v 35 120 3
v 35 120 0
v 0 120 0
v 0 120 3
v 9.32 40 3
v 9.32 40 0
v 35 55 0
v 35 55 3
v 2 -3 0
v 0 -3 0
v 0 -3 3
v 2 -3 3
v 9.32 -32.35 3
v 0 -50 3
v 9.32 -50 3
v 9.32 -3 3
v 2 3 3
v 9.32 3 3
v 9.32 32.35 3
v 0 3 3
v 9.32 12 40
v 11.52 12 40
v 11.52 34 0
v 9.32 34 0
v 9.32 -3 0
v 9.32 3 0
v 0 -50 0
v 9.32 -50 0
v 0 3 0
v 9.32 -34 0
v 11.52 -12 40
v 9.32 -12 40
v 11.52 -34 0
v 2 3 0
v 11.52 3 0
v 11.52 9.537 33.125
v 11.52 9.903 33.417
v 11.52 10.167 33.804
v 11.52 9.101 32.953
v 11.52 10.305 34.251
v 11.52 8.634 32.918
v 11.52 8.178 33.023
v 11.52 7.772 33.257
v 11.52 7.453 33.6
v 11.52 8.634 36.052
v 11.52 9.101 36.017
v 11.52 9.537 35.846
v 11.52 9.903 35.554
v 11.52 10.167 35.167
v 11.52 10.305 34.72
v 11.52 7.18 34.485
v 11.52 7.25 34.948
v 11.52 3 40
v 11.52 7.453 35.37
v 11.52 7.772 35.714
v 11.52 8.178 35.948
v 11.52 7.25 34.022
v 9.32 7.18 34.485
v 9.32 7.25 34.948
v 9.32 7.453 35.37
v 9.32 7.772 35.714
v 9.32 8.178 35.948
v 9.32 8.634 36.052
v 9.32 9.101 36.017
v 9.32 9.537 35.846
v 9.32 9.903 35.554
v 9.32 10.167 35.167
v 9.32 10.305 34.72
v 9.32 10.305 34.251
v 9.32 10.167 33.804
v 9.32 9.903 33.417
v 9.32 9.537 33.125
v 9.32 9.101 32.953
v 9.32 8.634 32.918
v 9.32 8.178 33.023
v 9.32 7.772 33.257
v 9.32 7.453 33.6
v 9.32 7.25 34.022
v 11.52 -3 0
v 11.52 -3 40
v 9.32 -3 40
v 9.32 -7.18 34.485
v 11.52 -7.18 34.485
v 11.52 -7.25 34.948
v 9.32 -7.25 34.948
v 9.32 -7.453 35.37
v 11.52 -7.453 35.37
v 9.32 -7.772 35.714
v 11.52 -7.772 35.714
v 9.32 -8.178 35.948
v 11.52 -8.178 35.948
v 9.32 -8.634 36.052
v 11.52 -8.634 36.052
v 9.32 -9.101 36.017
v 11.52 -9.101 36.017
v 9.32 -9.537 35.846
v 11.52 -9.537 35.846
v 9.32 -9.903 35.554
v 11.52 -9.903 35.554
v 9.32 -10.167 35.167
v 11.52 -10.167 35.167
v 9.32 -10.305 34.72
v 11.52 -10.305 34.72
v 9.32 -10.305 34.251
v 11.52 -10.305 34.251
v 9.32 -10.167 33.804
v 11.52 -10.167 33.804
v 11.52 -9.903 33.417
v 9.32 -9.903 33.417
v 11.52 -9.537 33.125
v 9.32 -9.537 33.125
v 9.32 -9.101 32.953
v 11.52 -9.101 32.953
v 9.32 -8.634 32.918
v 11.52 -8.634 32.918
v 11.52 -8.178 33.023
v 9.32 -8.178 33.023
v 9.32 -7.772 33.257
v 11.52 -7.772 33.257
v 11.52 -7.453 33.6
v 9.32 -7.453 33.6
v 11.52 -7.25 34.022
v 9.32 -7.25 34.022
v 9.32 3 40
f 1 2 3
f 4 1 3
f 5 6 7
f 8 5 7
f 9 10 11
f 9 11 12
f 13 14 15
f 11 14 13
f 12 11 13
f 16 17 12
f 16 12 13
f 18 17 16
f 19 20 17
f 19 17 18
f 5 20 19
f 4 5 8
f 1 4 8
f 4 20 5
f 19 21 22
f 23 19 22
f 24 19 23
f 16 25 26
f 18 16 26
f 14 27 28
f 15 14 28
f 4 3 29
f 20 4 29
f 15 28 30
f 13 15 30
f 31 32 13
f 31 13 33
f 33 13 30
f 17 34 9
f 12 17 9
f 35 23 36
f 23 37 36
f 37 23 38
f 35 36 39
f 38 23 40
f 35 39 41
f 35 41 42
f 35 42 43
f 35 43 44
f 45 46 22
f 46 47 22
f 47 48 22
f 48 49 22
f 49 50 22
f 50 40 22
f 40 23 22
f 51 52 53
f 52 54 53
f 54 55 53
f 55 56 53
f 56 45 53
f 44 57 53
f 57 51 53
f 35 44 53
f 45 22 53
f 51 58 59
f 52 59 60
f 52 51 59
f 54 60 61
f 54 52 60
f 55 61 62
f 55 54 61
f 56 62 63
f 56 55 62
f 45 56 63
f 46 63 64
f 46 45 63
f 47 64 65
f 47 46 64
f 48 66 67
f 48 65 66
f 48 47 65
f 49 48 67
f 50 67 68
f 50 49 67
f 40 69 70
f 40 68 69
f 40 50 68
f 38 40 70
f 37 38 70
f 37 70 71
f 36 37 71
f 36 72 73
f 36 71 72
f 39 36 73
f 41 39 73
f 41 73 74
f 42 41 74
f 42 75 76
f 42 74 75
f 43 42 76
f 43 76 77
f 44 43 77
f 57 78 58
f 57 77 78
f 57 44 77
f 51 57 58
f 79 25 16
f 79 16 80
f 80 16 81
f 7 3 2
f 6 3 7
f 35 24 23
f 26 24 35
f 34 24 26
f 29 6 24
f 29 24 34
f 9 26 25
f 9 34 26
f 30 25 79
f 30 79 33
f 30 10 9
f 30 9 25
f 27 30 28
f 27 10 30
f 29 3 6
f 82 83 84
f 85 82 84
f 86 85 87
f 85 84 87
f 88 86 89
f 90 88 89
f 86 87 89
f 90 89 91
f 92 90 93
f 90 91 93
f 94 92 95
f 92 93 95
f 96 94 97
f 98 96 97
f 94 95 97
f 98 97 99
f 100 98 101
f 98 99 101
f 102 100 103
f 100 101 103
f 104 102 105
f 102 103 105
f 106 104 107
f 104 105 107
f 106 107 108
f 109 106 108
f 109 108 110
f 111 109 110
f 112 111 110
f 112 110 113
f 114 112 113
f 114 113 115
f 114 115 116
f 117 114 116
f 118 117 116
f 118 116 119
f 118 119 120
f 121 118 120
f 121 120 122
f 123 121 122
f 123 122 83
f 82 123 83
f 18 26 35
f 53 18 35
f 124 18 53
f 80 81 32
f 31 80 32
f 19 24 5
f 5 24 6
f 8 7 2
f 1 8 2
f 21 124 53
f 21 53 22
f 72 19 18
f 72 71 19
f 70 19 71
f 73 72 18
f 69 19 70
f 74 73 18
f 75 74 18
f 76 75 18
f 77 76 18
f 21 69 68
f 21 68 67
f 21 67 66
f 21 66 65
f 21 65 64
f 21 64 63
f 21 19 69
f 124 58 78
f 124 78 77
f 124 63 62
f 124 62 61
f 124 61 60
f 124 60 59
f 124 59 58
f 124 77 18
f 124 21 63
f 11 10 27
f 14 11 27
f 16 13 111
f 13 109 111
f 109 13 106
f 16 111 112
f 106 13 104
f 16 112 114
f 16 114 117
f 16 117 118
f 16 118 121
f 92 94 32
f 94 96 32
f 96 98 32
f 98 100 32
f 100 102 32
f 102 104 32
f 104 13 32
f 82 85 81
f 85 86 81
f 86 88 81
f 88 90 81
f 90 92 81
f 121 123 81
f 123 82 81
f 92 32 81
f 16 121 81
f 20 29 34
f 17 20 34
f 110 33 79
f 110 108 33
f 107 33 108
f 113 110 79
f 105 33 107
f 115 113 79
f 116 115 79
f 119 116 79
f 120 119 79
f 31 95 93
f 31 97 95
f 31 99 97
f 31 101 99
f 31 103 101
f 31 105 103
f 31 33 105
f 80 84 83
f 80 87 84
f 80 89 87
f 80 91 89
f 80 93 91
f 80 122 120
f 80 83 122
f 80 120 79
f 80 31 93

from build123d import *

# Parameters (mm, degrees)
PAD_DEPTH       = 3
SKETCH001_W     = 2
SKETCH001_H     = 6
POCKET_DEPTH    = 5
PAD001_DEPTH    = 2.2
SKETCH003_R     = 1.571244
POCKET001_DEPTH = 5


with BuildPart() as part:
    # Sketch → Pad (new body)
    with BuildSketch(Plane.XY):
        Polygon((0, -50), (9.32, -50), (9.32, 40), (35, 55), (35, 120), (0, 120), align=None)
    extrude(amount=PAD_DEPTH)

    # Sketch001 (on Face7 of Pad) → Pocket (cut)
    with BuildSketch(Plane(origin=(0, 0, 0), x_dir=(1, 0, 0), z_dir=(0, 0, -1))):
        with Locations((1, 0)):
            Rectangle(SKETCH001_W, SKETCH001_H)
    pocket = extrude(amount=-POCKET_DEPTH, mode=Mode.SUBTRACT)

    # Sketch002 (on Face3 of Pocket) → Pad001 (join)
    with BuildSketch(Plane.YZ.offset(9.32)):
        Polygon((-3, 0), (-3, 40), (-12, 40), (-34, 0), align=None)
    pad001 = extrude(amount=PAD001_DEPTH)

    # Sketch003 (on Face18 of Pad001) → Pocket001 (cut)
    with BuildSketch(Plane.YZ.offset(11.52)):
        with Locations((-8.751605, 34.485332)):
            Circle(SKETCH003_R)
    pocket001 = extrude(amount=-POCKET001_DEPTH, mode=Mode.SUBTRACT)

    # Mirrored: Pocket, Pad001, Pocket001 across XZ
    add(pocket.mirror(Plane.XZ), mode=Mode.SUBTRACT)
    add(pad001.mirror(Plane.XZ))
    add(pocket001.mirror(Plane.XZ), mode=Mode.SUBTRACT)


solid = part.part
